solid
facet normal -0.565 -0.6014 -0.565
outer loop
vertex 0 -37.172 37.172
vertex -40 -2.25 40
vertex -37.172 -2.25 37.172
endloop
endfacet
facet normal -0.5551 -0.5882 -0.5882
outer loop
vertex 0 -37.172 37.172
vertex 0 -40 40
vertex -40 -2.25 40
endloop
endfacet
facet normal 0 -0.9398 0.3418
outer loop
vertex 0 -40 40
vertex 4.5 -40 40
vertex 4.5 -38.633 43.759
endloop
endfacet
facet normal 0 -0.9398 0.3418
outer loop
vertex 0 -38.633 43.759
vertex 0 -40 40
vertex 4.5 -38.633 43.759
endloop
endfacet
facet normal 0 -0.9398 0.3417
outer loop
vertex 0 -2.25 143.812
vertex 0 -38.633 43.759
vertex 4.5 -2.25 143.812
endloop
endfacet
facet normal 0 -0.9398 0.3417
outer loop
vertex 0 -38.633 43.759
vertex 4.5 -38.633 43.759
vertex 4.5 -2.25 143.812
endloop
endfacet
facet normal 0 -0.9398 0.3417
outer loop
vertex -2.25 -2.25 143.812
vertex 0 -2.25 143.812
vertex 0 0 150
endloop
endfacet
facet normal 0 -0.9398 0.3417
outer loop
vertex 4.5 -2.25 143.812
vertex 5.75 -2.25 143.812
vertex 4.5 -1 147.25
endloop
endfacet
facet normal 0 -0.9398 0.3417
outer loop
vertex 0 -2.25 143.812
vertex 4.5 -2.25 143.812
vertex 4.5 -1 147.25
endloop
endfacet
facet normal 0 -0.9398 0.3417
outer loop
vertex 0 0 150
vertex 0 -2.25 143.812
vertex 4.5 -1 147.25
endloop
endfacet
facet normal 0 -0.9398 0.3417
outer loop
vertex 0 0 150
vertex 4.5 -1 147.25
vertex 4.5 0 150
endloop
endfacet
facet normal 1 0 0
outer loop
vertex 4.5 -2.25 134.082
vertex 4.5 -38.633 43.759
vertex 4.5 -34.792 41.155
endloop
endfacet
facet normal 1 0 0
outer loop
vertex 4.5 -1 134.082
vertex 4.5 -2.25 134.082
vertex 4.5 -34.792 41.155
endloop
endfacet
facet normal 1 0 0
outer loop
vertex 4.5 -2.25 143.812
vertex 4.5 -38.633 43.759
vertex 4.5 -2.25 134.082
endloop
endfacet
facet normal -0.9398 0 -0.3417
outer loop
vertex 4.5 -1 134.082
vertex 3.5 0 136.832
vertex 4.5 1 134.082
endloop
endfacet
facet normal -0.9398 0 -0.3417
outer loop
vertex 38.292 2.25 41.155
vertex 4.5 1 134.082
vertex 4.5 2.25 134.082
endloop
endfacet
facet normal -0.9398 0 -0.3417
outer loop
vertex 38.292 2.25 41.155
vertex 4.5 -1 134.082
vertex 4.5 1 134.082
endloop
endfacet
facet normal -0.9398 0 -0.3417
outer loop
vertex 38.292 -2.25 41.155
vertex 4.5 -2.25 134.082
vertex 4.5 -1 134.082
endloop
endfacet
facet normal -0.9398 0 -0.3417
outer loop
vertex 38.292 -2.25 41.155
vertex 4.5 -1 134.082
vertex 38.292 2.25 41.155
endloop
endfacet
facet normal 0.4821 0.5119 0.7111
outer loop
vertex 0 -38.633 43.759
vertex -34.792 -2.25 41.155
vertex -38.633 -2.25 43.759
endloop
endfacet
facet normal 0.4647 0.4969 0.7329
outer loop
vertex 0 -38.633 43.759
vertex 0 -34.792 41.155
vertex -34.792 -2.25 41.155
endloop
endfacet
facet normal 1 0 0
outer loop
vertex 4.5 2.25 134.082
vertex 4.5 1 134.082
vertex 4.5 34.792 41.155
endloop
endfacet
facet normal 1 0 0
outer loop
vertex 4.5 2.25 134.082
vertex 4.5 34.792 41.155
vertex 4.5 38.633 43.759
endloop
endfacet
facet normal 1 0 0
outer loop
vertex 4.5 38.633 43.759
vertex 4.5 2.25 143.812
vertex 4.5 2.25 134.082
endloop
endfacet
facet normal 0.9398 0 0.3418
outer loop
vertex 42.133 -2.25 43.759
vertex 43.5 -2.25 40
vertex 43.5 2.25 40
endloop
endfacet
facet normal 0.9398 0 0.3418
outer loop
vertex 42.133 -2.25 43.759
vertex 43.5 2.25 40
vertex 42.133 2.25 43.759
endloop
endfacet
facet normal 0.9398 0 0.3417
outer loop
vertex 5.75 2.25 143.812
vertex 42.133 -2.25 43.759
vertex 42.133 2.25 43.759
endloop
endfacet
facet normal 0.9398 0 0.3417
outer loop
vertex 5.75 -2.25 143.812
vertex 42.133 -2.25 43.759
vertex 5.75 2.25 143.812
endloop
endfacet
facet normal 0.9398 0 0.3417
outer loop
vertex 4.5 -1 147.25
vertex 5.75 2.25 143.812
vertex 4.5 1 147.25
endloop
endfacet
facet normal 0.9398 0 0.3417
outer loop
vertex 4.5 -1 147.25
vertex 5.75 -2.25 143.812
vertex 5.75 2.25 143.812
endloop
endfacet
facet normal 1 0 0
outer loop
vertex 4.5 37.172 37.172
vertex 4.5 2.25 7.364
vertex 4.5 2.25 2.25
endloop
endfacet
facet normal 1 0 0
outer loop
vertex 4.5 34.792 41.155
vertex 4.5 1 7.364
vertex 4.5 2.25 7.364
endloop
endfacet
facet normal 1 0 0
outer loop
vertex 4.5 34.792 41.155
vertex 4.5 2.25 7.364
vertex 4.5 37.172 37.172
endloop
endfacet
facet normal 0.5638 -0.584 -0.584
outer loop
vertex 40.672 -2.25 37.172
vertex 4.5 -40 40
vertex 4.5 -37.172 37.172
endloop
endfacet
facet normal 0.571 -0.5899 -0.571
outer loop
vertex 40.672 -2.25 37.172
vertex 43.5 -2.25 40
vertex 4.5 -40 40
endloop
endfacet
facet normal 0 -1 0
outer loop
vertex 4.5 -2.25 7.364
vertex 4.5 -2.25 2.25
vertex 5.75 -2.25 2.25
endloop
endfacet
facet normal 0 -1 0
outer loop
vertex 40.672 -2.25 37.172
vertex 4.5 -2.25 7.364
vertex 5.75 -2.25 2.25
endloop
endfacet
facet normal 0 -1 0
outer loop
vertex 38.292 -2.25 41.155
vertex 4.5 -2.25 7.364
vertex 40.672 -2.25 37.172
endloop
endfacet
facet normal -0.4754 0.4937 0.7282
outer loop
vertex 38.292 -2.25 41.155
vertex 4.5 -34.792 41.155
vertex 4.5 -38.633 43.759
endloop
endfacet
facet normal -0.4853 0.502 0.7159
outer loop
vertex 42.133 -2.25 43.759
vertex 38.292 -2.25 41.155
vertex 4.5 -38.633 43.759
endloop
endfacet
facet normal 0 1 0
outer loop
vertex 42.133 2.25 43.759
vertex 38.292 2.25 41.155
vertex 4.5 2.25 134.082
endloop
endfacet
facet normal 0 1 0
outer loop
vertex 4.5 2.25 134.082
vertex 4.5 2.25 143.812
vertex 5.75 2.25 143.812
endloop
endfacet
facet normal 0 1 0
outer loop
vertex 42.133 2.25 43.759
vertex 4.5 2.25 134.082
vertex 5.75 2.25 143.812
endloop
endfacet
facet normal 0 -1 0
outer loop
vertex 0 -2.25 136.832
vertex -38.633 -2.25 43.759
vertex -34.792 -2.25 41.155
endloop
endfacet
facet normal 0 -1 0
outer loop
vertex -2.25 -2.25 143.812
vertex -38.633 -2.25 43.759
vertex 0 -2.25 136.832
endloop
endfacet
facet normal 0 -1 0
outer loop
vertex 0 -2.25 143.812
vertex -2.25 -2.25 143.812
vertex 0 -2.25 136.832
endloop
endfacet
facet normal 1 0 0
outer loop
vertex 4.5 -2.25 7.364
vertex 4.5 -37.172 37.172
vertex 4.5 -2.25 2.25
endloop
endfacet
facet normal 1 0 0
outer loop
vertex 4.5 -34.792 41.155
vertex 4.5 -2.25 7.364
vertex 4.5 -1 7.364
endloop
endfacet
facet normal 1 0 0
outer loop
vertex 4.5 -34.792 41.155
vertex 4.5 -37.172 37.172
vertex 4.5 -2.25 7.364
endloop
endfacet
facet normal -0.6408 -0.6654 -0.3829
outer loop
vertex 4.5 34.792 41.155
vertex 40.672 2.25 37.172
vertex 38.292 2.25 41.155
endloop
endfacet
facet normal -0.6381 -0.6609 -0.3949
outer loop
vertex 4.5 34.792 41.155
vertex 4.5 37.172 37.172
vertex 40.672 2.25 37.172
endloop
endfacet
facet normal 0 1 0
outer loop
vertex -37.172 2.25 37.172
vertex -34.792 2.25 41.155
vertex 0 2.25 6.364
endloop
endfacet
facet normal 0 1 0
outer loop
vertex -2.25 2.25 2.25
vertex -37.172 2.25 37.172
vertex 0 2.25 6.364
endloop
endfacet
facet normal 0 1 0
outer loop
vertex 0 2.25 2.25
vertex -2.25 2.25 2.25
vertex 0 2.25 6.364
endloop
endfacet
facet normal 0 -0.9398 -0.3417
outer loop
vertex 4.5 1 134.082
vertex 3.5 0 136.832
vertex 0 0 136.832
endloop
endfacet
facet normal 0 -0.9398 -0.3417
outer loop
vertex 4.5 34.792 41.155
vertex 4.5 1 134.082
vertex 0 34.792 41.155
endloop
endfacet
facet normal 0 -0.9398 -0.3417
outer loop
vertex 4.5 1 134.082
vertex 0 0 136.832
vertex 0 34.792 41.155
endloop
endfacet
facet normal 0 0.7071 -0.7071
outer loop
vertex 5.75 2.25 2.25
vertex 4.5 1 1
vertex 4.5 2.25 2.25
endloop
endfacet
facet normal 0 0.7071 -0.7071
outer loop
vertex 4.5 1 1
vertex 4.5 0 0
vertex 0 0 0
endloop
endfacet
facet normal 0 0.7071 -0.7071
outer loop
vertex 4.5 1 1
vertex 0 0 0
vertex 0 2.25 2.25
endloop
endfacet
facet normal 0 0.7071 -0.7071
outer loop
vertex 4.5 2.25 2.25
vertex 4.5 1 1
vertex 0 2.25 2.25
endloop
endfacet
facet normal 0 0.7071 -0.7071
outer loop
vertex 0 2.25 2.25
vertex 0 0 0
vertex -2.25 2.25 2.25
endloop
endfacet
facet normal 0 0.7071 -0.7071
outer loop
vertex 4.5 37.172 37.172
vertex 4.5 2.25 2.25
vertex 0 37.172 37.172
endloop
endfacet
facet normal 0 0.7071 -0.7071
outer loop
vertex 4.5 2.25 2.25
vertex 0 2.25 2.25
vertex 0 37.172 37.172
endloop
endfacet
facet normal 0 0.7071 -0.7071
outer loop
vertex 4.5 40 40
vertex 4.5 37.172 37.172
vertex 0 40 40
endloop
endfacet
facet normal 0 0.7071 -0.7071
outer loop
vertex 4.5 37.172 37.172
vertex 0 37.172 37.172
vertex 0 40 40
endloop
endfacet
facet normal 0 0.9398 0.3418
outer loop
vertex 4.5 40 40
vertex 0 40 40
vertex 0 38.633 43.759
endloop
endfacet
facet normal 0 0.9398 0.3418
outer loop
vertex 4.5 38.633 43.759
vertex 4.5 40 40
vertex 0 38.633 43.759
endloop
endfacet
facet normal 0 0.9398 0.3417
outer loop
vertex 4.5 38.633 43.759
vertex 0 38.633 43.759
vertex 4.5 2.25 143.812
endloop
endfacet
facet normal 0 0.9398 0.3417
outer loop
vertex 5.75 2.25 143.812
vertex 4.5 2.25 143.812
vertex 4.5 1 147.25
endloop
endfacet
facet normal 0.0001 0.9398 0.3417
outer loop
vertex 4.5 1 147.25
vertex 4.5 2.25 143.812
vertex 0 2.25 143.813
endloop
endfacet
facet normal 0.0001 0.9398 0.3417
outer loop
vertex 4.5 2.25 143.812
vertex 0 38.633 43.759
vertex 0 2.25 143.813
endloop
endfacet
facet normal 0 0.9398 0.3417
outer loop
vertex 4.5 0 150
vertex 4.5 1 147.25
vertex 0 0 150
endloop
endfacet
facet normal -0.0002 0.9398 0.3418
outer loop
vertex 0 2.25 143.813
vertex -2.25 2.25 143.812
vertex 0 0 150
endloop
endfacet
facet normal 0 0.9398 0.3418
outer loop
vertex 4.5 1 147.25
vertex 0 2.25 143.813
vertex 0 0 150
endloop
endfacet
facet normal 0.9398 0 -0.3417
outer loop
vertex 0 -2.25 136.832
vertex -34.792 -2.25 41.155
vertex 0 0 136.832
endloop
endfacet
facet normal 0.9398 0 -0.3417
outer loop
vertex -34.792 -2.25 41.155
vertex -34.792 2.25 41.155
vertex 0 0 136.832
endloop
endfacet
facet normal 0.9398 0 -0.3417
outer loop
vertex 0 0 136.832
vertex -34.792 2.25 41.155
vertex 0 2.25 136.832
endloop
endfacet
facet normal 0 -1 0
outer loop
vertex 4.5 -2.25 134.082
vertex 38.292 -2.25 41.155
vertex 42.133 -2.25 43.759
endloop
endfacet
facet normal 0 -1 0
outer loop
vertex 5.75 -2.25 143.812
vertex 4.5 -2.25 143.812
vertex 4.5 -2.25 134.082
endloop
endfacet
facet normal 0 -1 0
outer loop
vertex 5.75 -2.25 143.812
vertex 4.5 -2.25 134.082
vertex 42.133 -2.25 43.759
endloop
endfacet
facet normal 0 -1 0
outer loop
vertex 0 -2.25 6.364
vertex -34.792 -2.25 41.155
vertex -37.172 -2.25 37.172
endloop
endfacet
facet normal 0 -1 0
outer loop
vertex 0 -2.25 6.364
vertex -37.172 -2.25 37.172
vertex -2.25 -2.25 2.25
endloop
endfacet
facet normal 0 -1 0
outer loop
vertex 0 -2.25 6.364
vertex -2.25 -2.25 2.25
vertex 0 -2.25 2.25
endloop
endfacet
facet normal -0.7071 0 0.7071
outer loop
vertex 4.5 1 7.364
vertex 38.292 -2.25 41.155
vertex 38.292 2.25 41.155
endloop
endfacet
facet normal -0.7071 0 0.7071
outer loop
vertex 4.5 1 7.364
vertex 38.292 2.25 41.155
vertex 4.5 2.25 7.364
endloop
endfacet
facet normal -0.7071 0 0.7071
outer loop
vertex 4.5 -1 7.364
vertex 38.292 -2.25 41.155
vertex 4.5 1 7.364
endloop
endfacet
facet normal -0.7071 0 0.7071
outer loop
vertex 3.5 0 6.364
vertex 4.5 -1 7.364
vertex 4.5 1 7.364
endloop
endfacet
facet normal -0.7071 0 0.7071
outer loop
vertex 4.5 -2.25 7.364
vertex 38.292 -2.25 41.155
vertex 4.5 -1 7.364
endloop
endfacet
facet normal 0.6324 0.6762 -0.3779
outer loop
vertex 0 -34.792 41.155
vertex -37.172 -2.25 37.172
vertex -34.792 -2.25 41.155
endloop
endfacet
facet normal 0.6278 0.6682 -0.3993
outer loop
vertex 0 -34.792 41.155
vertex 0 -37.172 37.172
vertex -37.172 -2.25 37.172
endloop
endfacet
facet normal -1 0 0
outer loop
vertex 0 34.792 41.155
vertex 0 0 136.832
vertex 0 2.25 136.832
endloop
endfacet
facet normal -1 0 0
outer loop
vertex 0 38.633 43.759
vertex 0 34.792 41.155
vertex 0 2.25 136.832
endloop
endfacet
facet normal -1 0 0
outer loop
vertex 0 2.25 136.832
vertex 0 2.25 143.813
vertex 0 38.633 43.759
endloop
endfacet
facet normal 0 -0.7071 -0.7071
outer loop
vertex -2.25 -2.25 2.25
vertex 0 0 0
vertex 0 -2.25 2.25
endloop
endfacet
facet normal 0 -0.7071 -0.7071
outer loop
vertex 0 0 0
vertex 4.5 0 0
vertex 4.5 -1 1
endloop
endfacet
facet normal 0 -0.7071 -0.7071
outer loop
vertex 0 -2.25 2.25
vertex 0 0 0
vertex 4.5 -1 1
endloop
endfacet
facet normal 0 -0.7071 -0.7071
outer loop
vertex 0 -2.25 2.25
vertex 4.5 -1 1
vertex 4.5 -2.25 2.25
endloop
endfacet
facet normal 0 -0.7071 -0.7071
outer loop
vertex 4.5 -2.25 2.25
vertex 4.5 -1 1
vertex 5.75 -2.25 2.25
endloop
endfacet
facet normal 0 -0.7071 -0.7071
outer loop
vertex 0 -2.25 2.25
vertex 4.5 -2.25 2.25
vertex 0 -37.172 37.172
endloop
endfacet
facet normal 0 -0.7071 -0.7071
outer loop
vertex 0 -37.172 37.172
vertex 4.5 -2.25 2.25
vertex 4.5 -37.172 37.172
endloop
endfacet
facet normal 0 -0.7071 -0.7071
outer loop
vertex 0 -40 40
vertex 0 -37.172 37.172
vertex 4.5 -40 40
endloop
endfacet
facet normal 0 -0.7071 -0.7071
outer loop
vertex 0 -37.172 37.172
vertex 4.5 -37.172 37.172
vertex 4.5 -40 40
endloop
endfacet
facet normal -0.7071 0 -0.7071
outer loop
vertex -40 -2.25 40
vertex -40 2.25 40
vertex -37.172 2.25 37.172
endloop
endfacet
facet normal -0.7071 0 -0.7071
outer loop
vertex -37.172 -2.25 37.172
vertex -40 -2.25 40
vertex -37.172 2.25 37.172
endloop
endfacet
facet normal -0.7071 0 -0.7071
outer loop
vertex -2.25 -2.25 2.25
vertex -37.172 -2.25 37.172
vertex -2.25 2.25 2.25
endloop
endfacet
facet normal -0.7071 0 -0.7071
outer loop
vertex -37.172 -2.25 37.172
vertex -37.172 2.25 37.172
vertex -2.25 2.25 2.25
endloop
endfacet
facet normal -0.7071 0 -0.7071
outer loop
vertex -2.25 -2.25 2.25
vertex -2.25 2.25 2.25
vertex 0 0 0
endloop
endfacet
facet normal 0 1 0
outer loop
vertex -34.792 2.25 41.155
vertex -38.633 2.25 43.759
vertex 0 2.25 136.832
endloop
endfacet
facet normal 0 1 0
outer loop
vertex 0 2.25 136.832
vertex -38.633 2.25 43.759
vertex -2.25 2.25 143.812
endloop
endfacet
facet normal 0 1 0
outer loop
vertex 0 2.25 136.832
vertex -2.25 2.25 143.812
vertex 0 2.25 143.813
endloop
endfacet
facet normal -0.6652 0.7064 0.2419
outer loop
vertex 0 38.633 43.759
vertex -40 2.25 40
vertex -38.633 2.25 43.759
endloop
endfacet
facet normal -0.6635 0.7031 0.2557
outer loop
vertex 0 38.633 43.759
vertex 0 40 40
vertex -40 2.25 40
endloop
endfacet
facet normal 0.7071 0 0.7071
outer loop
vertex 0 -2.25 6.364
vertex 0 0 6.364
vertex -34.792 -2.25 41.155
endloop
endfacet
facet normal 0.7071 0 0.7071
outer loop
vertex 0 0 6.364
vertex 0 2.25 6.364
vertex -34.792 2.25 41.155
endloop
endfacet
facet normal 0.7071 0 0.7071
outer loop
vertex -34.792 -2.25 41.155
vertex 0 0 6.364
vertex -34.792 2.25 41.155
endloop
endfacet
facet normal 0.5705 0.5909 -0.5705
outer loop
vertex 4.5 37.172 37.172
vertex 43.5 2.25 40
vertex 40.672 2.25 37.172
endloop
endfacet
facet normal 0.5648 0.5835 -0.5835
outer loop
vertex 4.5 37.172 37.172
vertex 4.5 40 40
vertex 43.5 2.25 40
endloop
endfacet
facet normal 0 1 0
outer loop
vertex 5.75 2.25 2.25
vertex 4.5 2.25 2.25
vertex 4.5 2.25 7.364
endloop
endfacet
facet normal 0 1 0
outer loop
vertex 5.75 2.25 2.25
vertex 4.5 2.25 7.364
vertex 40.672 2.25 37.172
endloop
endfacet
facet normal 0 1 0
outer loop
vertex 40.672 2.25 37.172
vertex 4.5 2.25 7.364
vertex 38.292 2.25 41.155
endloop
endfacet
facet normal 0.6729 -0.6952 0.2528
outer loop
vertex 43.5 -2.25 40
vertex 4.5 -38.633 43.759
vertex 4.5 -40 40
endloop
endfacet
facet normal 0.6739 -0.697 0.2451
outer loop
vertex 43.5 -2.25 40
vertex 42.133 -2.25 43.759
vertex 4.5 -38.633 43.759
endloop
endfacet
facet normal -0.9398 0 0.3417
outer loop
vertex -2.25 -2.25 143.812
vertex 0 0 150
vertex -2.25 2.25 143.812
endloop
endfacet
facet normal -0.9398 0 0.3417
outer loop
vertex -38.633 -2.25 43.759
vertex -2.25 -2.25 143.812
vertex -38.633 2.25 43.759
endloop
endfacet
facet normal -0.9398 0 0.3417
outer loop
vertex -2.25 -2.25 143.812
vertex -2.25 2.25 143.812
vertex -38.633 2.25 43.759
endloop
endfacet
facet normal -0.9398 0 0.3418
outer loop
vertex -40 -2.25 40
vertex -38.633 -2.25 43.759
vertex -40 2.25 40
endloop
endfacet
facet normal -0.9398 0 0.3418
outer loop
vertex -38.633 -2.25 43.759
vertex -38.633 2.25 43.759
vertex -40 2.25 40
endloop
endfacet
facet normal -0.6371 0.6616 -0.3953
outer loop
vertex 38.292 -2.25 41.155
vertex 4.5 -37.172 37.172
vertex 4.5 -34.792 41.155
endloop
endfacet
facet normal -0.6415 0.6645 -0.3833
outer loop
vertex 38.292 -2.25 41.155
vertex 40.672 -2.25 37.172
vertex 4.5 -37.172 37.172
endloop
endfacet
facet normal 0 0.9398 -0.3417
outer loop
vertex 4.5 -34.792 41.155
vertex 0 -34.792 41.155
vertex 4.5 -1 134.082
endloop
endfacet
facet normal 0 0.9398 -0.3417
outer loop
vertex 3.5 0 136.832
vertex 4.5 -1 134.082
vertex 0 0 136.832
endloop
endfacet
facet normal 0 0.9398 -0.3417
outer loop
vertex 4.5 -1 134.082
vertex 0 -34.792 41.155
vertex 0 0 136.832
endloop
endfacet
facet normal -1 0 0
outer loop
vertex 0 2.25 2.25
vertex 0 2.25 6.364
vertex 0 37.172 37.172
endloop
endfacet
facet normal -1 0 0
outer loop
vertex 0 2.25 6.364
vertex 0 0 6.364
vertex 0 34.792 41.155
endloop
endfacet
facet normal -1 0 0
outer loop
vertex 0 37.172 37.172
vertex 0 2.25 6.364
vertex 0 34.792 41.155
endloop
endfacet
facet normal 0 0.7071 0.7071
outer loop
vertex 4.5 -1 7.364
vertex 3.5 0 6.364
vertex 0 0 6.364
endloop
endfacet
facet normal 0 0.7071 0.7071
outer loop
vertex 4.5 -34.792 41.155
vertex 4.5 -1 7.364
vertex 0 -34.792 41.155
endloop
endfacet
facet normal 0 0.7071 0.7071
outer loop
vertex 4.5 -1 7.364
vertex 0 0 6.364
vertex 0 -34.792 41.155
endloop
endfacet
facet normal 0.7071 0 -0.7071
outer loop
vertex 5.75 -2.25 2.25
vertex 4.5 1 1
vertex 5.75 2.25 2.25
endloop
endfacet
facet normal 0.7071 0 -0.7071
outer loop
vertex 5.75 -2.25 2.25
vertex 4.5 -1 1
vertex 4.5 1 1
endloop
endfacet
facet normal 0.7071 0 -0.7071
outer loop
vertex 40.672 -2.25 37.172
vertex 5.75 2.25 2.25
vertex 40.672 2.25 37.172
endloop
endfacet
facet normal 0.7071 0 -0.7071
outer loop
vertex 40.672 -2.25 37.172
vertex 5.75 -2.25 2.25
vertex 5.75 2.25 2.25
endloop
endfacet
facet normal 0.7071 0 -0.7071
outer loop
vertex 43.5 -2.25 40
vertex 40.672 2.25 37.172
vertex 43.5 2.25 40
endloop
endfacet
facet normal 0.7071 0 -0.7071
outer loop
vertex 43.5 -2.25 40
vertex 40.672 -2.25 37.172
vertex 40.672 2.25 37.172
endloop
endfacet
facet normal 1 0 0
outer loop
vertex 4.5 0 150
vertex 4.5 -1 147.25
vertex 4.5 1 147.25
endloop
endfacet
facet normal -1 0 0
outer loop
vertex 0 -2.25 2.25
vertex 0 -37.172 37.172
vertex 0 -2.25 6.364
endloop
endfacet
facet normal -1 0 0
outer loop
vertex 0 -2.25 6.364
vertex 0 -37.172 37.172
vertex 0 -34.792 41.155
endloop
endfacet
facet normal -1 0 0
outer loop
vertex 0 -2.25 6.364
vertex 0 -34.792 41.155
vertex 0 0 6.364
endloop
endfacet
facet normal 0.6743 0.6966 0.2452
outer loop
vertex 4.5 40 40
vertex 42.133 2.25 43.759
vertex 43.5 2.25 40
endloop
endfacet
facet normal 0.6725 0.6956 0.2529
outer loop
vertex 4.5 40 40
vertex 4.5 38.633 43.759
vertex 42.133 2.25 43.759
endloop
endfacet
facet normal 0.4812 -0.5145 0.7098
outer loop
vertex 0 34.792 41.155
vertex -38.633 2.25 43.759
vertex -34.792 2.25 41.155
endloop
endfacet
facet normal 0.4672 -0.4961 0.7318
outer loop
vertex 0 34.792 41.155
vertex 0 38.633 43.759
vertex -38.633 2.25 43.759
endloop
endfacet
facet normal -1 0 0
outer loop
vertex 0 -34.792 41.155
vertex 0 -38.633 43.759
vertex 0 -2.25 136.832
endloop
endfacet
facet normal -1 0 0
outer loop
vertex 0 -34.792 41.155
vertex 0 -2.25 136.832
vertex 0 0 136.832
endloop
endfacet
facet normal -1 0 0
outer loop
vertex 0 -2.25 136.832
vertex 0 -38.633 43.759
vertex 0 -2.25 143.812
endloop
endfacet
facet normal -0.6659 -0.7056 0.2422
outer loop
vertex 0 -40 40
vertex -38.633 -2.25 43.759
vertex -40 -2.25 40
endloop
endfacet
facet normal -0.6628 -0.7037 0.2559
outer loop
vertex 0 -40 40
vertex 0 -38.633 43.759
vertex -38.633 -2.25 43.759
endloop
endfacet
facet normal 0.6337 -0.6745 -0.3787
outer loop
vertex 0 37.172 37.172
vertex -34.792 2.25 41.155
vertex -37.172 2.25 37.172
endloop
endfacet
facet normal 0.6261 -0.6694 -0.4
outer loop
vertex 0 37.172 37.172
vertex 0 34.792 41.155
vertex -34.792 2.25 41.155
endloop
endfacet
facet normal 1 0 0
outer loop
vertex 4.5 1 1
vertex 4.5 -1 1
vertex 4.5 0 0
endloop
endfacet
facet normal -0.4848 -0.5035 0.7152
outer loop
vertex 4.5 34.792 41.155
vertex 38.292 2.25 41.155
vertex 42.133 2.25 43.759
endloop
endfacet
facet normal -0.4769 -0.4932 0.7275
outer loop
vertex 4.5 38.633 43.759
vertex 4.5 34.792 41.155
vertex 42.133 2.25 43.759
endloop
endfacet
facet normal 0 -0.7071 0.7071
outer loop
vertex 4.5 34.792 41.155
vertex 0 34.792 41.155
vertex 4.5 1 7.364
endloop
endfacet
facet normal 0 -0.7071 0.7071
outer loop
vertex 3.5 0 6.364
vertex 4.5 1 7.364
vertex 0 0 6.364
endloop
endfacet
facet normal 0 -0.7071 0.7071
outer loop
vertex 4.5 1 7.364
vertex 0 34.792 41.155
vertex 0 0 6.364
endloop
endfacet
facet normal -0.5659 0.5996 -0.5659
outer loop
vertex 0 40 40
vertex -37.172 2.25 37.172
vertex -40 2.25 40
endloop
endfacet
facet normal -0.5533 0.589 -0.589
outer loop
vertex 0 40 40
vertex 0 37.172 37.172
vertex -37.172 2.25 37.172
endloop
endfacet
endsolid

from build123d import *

# Parameters (mm, degrees)
F1_DEPTH = 4.5
F5_DEPTH = 2.25
F7_DEPTH = 12.5


with BuildPart() as f1:
    # F0 (on Right) → F1 (new body)
    with BuildSketch(Plane.YZ):
        Polygon((-40, 40), (0, 0), (40, 40), (0, 150), align=None)
        Polygon((-34.7915337519, 41.1554947826), (0, 136.8322126004), (34.7915337519, 41.1554947826), (0, 6.3639610307), align=None, mode=Mode.SUBTRACT)
    extrude(amount=F1_DEPTH)

    # F4 (on Front) → F5 (join, symmetric)
    with BuildSketch(Plane.XZ):
        Polygon((-40, 40), (0, 0), (0, 6.3639610307), (-34.7915337519, 41.1554947826), (0, 136.8322126004), (0, 150), align=None)
        Polygon((38.2915337519, 41.1554947826), (3.5, 6.3639610307), (3.5, 0), (43.5, 40), (3.5, 150), (3.5, 136.8322126004), align=None)
    extrude(amount=F5_DEPTH, both=True)

    # F6 (on offset) → F7 (cut, symmetric)
    with BuildSketch(Plane.YZ.offset(1.75)):
        Polygon((-46.8705444882, 150), (-40, 40), (0, 150), align=None)
        Polygon((46.8705444882, 150), (0, 150), (40, 40), align=None)
        Polygon((0, 0), (-40, 40), (-40, 0), align=None)
        Polygon((40, 40), (0, 0), (40, 0), align=None)
    extrude(amount=F7_DEPTH, both=True, mode=Mode.SUBTRACT)

    # F8 (on face) → F10 section 0
    with BuildSketch(Plane.YZ.offset(4.5)):
        Polygon((-38.6330277477, 43.759173694), (-40, 40), (-37.1715728753, 37.1715728753), (-34.7915337519, 41.1554947826), align=None)
    # F9 (on face) → F10 section 1
    with BuildSketch(Plane.XZ.offset(2.25)):
        Polygon((40.6715728753, 37.1715728753), (43.5, 40), (42.1330277477, 43.759173694), (38.2915337519, 41.1554947826), align=None)
    loft()

    # F11 (on face) → F13 section 0
    with BuildSketch(Plane(origin=(0, 2.25, 0), x_dir=(-1, 0, 0), z_dir=(0, 1, 0))):
        Polygon((-42.1330277477, 43.759173694), (-43.5, 40), (-40.6715728753, 37.1715728753), (-38.2915337519, 41.1554947826), align=None)
    # F12 (on face) → F13 section 1
    with BuildSketch(Plane.YZ.offset(4.5)):
        Polygon((37.1715728753, 37.1715728753), (40, 40), (38.6330277477, 43.759173694), (34.7915337519, 41.1554947826), align=None)
    loft()

    # F15 (on face) → F16 section 0
    with BuildSketch(Plane(origin=(0, 2.25, 0), x_dir=(-1, 0, 0), z_dir=(0, 1, 0))):
        Polygon((37.1715728753, 37.1715728753), (40, 40), (38.6330277477, 43.759173694), (34.7915337519, 41.1554947826), align=None)
    # F14 (on face) → F16 section 1
    with BuildSketch(Plane(origin=(0, 0, 0), x_dir=(0, -1, 0), z_dir=(-1, 0, 0))):
        Polygon((-38.6330277477, 43.759173694), (-40, 40), (-37.1715728753, 37.1715728753), (-34.7915337519, 41.1554947826), align=None)
    loft()

    # F17 (on face) → F19 section 0
    with BuildSketch(Plane.XZ.offset(2.25)):
        Polygon((-38.6330277477, 43.759173694), (-40, 40), (-37.1715728753, 37.1715728753), (-34.7915337519, 41.1554947826), align=None)
    # F18 (on face) → F19 section 1
    with BuildSketch(Plane(origin=(0, 0, 0), x_dir=(0, -1, 0), z_dir=(-1, 0, 0))):
        Polygon((37.1715728753, 37.1715728753), (40, 40), (38.6330277477, 43.759173694), (34.7915337519, 41.1554947826), align=None)
    loft()


solid = f1.part
